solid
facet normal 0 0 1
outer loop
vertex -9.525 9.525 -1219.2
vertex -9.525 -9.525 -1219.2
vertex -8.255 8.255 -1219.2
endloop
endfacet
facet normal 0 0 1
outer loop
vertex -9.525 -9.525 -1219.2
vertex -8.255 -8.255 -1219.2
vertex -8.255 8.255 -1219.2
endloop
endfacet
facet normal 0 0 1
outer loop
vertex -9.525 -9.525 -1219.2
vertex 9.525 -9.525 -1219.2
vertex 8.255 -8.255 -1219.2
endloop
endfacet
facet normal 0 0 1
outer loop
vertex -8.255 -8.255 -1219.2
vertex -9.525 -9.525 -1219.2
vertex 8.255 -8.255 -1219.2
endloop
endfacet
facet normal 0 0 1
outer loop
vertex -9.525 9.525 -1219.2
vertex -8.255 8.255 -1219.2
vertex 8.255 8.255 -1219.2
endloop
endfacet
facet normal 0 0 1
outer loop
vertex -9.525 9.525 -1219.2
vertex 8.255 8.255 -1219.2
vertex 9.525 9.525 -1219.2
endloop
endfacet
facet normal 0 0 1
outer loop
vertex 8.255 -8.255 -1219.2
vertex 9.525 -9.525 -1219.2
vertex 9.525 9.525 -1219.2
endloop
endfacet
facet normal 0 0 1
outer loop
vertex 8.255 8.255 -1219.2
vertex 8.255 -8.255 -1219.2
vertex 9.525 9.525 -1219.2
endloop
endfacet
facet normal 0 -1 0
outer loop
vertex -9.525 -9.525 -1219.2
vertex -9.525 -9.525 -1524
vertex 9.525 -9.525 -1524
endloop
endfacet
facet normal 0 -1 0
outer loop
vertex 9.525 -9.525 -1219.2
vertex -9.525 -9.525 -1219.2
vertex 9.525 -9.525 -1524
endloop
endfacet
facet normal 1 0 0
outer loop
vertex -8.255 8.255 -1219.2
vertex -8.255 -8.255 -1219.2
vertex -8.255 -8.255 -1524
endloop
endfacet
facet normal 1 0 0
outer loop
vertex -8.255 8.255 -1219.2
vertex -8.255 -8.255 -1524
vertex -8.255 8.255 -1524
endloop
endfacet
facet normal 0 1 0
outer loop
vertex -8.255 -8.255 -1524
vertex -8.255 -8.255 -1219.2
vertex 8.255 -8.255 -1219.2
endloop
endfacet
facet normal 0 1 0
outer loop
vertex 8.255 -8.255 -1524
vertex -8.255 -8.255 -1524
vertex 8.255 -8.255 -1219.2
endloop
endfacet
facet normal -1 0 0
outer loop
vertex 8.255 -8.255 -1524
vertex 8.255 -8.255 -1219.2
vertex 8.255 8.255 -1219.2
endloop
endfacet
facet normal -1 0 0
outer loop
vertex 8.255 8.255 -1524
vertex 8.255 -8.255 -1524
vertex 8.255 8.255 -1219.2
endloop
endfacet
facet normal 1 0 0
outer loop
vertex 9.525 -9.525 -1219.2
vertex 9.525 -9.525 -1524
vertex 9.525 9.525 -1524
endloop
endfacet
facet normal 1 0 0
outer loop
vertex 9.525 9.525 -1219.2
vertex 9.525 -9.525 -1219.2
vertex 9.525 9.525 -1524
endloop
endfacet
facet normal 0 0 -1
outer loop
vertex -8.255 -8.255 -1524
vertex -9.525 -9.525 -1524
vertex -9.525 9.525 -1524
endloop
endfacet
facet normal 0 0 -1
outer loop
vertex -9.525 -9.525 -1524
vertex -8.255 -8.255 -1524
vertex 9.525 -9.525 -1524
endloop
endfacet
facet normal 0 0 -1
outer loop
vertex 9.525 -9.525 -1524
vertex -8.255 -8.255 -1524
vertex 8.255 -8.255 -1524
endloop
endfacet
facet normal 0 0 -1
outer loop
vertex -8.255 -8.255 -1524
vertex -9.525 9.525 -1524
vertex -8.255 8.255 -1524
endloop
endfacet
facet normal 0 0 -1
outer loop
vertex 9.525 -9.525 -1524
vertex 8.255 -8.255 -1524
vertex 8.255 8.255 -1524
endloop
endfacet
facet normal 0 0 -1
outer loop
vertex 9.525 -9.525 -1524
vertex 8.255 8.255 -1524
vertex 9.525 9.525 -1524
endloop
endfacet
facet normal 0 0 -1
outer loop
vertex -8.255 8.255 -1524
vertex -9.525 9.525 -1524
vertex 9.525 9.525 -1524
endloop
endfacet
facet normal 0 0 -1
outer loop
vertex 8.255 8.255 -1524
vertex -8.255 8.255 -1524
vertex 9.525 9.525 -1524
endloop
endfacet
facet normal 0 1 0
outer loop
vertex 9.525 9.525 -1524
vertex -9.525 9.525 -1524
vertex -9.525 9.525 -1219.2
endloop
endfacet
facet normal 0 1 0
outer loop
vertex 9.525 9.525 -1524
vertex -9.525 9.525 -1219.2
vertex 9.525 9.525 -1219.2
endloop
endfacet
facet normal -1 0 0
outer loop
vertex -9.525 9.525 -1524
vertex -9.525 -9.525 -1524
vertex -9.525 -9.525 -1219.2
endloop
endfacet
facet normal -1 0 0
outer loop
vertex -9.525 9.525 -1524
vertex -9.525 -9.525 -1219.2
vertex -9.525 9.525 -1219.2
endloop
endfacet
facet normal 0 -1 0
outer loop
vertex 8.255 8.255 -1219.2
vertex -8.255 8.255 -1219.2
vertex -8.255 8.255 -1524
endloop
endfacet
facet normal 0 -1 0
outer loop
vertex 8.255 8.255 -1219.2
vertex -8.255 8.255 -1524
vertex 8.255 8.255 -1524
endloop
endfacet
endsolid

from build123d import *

# Parameters (mm, degrees)
SKETCH1_W           = 19.05
SKETCH1_H           = 19.05
SKETCH1_W_2         = 16.51
SKETCH1_H_2         = 16.51
BOSS_EXTRUDE1_DEPTH = 1524
SKETCH2_W           = 2743.2
SKETCH2_H           = 19.05
CUT_EXTRUDE1_DEPTH  = 1525.148820859


with BuildPart() as part:
    # Sketch1 → Boss-Extrude1 (new, symmetric)
    with BuildSketch(Plane.XY):
        Rectangle(SKETCH1_W, SKETCH1_H)
        Rectangle(SKETCH1_W_2, SKETCH1_H_2, mode=Mode.SUBTRACT)
    extrude(amount=BOSS_EXTRUDE1_DEPTH, both=True)

    # Sketch2 → Cut-Extrude1 (cut, through all)
    with BuildSketch(Plane(origin=(9.525, 0, 0), x_dir=(0, 0, -1), z_dir=(1, 0, 0))):
        with Locations((-152.4, 0)):
            Rectangle(SKETCH2_W, SKETCH2_H)
    extrude(amount=-CUT_EXTRUDE1_DEPTH, mode=Mode.SUBTRACT)


solid = part.part
